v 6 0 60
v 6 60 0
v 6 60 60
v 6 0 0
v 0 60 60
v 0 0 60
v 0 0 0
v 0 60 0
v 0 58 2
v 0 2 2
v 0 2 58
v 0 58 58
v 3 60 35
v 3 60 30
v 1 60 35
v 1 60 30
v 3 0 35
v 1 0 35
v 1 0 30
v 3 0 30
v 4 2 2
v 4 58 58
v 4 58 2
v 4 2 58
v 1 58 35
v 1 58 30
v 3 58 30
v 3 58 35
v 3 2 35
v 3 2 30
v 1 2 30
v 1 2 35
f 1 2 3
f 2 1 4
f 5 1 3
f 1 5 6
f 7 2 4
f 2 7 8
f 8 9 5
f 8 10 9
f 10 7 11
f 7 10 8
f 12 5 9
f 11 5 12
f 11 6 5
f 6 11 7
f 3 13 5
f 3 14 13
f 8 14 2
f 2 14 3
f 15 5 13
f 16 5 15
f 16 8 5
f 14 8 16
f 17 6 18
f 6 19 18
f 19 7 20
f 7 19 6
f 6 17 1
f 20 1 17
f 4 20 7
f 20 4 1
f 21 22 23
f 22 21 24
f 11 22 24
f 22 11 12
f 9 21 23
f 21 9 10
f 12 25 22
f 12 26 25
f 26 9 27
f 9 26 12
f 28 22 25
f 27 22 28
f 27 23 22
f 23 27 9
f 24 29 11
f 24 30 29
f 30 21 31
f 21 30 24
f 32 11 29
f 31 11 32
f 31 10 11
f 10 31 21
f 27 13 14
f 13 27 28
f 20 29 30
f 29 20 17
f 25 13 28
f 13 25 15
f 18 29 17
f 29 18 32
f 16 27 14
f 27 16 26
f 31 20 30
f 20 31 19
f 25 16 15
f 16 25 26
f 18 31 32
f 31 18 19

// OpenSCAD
// file: ../../common/primitives.scad
// Module case
module case(h, w, l, t) {
    difference(){
		cube([h,w,l]);
		translate([-t,t,t]) {
  			cube([h,w-2*t,l-2*t]);
		}
	}
}

// Module holes
module case_hole(edge_distance_w ,edge_distance_l, hole_radius) {
    translate([0,edge_distance_w,edge_distance_l]) {
		rotate([0,90,0]){
			cylinder(h = 30, r=hole_radius, $fn=50);
		} 
	}
}

// PCB
module pcb(translation_w,translation_l,translation_h,pcb_width,pcb_length,pcb_thickness,pcb_hole_radius,pcb_hole_distance) 
{		
	translate([translation_h,translation_w,translation_l]){
		rotate([0,-90,0]){
	difference(){
		cube([pcb_width,pcb_length,pcb_thickness]);
		translate([pcb_hole_distance,pcb_hole_distance,-10]) {
			cylinder(h = 30, r=pcb_hole_radius, $fn=50);
		}
		translate([pcb_width-pcb_hole_distance,pcb_length-pcb_hole_distance,-10]) {
			cylinder(h = 30, r=pcb_hole_radius, $fn=50);
		}
	}
	}
	}
}

// PCB attaches
module pcb_attaches(case_w,case_l,case_h,pcb_length,pcb_width,pcb_hole_radius,pcb_hole_distance,pcb_attach_h){
	rotate([0,-90,0]){
		translate([(case_w-pcb_length)/2 + pcb_hole_radius + pcb_hole_distance, (case_l-pcb_width)/2 + pcb_hole_distance - pcb_hole_radius,-case_h]) {
			difference(){
				cylinder(h = pcb_attach_h, r=2*pcb_hole_radius, $fn=50);
				translate([0,0,pcb_attach_h/2]){
					cylinder(h = 10, r=pcb_hole_radius, $fn=50);
				}
			}
		}

		translate([case_l-pcb_hole_distance - (case_w-pcb_length)/2 - pcb_hole_radius,case_w-pcb_hole_distance-(case_l-pcb_width)/2 + pcb_hole_radius,-case_h]) {
			difference(){
				cylinder(h = pcb_attach_h, r=2*pcb_hole_radius, $fn=50);
				translate([0,0,pcb_attach_h/2]){
					cylinder(h = 10, r=pcb_hole_radius, $fn=50);
				}
			}
		}
	}
}

// PCB attach
module pcb_attach(translation_w,translation_l,case_h,pcb_length,pcb_width,pcb_hole_radius,pcb_hole_distance,pcb_attach_h){
	rotate([0,-90,0]){
		translate([translation_w + pcb_hole_radius + pcb_hole_distance, translation_l + pcb_hole_distance - pcb_hole_radius,-case_h]) {
			difference(){
				cylinder(h = pcb_attach_h, r=2*pcb_hole_radius, $fn=50);
				translate([0,0,pcb_attach_h/2]){
					cylinder(h = 10, r=pcb_hole_radius, $fn=50);
				}
			}
		}

		translate([translation_w + pcb_width - pcb_hole_distance,translation_l + pcb_length - pcb_hole_distance,-case_h]) {
			difference(){
				cylinder(h = pcb_attach_h, r=2*pcb_hole_radius, $fn=50);
				translate([0,0,pcb_attach_h/2]){
					cylinder(h = 10, r=pcb_hole_radius, $fn=50);
				}
			}
		}
	}
}

// Batteries
module batteries(w,l,translation,battery_r, battery_h, number_batteries){
	for ( i = [0 : number_batteries - 1] ){
		translate([translation,battery_r + (w-6*battery_r)/2+i*battery_r*2,(l-battery_h)/2]){
			cylinder(h = battery_h, r=battery_r, $fn=50);
		}
	}
}
// main file
// Use common library
use <../../common/primitives.scad>;

// Parameters

// Main box
w = 60;
l = 60;
h = 6;
thickness = 2; 
pcb_attach_h = 5;
draw_box = 1;

// Clips
attach_clip_w = 5;
attach_clip_l = 2;
distance_from_edge = 1;

// Front box
if (draw_box == 1){
	difference(){

		case(h, w, l, thickness);

		// Clips on the sides
		translate([distance_from_edge,-5,l/2]) {
			cube([attach_clip_l,100,attach_clip_w]);
		} 
	
	}
}
